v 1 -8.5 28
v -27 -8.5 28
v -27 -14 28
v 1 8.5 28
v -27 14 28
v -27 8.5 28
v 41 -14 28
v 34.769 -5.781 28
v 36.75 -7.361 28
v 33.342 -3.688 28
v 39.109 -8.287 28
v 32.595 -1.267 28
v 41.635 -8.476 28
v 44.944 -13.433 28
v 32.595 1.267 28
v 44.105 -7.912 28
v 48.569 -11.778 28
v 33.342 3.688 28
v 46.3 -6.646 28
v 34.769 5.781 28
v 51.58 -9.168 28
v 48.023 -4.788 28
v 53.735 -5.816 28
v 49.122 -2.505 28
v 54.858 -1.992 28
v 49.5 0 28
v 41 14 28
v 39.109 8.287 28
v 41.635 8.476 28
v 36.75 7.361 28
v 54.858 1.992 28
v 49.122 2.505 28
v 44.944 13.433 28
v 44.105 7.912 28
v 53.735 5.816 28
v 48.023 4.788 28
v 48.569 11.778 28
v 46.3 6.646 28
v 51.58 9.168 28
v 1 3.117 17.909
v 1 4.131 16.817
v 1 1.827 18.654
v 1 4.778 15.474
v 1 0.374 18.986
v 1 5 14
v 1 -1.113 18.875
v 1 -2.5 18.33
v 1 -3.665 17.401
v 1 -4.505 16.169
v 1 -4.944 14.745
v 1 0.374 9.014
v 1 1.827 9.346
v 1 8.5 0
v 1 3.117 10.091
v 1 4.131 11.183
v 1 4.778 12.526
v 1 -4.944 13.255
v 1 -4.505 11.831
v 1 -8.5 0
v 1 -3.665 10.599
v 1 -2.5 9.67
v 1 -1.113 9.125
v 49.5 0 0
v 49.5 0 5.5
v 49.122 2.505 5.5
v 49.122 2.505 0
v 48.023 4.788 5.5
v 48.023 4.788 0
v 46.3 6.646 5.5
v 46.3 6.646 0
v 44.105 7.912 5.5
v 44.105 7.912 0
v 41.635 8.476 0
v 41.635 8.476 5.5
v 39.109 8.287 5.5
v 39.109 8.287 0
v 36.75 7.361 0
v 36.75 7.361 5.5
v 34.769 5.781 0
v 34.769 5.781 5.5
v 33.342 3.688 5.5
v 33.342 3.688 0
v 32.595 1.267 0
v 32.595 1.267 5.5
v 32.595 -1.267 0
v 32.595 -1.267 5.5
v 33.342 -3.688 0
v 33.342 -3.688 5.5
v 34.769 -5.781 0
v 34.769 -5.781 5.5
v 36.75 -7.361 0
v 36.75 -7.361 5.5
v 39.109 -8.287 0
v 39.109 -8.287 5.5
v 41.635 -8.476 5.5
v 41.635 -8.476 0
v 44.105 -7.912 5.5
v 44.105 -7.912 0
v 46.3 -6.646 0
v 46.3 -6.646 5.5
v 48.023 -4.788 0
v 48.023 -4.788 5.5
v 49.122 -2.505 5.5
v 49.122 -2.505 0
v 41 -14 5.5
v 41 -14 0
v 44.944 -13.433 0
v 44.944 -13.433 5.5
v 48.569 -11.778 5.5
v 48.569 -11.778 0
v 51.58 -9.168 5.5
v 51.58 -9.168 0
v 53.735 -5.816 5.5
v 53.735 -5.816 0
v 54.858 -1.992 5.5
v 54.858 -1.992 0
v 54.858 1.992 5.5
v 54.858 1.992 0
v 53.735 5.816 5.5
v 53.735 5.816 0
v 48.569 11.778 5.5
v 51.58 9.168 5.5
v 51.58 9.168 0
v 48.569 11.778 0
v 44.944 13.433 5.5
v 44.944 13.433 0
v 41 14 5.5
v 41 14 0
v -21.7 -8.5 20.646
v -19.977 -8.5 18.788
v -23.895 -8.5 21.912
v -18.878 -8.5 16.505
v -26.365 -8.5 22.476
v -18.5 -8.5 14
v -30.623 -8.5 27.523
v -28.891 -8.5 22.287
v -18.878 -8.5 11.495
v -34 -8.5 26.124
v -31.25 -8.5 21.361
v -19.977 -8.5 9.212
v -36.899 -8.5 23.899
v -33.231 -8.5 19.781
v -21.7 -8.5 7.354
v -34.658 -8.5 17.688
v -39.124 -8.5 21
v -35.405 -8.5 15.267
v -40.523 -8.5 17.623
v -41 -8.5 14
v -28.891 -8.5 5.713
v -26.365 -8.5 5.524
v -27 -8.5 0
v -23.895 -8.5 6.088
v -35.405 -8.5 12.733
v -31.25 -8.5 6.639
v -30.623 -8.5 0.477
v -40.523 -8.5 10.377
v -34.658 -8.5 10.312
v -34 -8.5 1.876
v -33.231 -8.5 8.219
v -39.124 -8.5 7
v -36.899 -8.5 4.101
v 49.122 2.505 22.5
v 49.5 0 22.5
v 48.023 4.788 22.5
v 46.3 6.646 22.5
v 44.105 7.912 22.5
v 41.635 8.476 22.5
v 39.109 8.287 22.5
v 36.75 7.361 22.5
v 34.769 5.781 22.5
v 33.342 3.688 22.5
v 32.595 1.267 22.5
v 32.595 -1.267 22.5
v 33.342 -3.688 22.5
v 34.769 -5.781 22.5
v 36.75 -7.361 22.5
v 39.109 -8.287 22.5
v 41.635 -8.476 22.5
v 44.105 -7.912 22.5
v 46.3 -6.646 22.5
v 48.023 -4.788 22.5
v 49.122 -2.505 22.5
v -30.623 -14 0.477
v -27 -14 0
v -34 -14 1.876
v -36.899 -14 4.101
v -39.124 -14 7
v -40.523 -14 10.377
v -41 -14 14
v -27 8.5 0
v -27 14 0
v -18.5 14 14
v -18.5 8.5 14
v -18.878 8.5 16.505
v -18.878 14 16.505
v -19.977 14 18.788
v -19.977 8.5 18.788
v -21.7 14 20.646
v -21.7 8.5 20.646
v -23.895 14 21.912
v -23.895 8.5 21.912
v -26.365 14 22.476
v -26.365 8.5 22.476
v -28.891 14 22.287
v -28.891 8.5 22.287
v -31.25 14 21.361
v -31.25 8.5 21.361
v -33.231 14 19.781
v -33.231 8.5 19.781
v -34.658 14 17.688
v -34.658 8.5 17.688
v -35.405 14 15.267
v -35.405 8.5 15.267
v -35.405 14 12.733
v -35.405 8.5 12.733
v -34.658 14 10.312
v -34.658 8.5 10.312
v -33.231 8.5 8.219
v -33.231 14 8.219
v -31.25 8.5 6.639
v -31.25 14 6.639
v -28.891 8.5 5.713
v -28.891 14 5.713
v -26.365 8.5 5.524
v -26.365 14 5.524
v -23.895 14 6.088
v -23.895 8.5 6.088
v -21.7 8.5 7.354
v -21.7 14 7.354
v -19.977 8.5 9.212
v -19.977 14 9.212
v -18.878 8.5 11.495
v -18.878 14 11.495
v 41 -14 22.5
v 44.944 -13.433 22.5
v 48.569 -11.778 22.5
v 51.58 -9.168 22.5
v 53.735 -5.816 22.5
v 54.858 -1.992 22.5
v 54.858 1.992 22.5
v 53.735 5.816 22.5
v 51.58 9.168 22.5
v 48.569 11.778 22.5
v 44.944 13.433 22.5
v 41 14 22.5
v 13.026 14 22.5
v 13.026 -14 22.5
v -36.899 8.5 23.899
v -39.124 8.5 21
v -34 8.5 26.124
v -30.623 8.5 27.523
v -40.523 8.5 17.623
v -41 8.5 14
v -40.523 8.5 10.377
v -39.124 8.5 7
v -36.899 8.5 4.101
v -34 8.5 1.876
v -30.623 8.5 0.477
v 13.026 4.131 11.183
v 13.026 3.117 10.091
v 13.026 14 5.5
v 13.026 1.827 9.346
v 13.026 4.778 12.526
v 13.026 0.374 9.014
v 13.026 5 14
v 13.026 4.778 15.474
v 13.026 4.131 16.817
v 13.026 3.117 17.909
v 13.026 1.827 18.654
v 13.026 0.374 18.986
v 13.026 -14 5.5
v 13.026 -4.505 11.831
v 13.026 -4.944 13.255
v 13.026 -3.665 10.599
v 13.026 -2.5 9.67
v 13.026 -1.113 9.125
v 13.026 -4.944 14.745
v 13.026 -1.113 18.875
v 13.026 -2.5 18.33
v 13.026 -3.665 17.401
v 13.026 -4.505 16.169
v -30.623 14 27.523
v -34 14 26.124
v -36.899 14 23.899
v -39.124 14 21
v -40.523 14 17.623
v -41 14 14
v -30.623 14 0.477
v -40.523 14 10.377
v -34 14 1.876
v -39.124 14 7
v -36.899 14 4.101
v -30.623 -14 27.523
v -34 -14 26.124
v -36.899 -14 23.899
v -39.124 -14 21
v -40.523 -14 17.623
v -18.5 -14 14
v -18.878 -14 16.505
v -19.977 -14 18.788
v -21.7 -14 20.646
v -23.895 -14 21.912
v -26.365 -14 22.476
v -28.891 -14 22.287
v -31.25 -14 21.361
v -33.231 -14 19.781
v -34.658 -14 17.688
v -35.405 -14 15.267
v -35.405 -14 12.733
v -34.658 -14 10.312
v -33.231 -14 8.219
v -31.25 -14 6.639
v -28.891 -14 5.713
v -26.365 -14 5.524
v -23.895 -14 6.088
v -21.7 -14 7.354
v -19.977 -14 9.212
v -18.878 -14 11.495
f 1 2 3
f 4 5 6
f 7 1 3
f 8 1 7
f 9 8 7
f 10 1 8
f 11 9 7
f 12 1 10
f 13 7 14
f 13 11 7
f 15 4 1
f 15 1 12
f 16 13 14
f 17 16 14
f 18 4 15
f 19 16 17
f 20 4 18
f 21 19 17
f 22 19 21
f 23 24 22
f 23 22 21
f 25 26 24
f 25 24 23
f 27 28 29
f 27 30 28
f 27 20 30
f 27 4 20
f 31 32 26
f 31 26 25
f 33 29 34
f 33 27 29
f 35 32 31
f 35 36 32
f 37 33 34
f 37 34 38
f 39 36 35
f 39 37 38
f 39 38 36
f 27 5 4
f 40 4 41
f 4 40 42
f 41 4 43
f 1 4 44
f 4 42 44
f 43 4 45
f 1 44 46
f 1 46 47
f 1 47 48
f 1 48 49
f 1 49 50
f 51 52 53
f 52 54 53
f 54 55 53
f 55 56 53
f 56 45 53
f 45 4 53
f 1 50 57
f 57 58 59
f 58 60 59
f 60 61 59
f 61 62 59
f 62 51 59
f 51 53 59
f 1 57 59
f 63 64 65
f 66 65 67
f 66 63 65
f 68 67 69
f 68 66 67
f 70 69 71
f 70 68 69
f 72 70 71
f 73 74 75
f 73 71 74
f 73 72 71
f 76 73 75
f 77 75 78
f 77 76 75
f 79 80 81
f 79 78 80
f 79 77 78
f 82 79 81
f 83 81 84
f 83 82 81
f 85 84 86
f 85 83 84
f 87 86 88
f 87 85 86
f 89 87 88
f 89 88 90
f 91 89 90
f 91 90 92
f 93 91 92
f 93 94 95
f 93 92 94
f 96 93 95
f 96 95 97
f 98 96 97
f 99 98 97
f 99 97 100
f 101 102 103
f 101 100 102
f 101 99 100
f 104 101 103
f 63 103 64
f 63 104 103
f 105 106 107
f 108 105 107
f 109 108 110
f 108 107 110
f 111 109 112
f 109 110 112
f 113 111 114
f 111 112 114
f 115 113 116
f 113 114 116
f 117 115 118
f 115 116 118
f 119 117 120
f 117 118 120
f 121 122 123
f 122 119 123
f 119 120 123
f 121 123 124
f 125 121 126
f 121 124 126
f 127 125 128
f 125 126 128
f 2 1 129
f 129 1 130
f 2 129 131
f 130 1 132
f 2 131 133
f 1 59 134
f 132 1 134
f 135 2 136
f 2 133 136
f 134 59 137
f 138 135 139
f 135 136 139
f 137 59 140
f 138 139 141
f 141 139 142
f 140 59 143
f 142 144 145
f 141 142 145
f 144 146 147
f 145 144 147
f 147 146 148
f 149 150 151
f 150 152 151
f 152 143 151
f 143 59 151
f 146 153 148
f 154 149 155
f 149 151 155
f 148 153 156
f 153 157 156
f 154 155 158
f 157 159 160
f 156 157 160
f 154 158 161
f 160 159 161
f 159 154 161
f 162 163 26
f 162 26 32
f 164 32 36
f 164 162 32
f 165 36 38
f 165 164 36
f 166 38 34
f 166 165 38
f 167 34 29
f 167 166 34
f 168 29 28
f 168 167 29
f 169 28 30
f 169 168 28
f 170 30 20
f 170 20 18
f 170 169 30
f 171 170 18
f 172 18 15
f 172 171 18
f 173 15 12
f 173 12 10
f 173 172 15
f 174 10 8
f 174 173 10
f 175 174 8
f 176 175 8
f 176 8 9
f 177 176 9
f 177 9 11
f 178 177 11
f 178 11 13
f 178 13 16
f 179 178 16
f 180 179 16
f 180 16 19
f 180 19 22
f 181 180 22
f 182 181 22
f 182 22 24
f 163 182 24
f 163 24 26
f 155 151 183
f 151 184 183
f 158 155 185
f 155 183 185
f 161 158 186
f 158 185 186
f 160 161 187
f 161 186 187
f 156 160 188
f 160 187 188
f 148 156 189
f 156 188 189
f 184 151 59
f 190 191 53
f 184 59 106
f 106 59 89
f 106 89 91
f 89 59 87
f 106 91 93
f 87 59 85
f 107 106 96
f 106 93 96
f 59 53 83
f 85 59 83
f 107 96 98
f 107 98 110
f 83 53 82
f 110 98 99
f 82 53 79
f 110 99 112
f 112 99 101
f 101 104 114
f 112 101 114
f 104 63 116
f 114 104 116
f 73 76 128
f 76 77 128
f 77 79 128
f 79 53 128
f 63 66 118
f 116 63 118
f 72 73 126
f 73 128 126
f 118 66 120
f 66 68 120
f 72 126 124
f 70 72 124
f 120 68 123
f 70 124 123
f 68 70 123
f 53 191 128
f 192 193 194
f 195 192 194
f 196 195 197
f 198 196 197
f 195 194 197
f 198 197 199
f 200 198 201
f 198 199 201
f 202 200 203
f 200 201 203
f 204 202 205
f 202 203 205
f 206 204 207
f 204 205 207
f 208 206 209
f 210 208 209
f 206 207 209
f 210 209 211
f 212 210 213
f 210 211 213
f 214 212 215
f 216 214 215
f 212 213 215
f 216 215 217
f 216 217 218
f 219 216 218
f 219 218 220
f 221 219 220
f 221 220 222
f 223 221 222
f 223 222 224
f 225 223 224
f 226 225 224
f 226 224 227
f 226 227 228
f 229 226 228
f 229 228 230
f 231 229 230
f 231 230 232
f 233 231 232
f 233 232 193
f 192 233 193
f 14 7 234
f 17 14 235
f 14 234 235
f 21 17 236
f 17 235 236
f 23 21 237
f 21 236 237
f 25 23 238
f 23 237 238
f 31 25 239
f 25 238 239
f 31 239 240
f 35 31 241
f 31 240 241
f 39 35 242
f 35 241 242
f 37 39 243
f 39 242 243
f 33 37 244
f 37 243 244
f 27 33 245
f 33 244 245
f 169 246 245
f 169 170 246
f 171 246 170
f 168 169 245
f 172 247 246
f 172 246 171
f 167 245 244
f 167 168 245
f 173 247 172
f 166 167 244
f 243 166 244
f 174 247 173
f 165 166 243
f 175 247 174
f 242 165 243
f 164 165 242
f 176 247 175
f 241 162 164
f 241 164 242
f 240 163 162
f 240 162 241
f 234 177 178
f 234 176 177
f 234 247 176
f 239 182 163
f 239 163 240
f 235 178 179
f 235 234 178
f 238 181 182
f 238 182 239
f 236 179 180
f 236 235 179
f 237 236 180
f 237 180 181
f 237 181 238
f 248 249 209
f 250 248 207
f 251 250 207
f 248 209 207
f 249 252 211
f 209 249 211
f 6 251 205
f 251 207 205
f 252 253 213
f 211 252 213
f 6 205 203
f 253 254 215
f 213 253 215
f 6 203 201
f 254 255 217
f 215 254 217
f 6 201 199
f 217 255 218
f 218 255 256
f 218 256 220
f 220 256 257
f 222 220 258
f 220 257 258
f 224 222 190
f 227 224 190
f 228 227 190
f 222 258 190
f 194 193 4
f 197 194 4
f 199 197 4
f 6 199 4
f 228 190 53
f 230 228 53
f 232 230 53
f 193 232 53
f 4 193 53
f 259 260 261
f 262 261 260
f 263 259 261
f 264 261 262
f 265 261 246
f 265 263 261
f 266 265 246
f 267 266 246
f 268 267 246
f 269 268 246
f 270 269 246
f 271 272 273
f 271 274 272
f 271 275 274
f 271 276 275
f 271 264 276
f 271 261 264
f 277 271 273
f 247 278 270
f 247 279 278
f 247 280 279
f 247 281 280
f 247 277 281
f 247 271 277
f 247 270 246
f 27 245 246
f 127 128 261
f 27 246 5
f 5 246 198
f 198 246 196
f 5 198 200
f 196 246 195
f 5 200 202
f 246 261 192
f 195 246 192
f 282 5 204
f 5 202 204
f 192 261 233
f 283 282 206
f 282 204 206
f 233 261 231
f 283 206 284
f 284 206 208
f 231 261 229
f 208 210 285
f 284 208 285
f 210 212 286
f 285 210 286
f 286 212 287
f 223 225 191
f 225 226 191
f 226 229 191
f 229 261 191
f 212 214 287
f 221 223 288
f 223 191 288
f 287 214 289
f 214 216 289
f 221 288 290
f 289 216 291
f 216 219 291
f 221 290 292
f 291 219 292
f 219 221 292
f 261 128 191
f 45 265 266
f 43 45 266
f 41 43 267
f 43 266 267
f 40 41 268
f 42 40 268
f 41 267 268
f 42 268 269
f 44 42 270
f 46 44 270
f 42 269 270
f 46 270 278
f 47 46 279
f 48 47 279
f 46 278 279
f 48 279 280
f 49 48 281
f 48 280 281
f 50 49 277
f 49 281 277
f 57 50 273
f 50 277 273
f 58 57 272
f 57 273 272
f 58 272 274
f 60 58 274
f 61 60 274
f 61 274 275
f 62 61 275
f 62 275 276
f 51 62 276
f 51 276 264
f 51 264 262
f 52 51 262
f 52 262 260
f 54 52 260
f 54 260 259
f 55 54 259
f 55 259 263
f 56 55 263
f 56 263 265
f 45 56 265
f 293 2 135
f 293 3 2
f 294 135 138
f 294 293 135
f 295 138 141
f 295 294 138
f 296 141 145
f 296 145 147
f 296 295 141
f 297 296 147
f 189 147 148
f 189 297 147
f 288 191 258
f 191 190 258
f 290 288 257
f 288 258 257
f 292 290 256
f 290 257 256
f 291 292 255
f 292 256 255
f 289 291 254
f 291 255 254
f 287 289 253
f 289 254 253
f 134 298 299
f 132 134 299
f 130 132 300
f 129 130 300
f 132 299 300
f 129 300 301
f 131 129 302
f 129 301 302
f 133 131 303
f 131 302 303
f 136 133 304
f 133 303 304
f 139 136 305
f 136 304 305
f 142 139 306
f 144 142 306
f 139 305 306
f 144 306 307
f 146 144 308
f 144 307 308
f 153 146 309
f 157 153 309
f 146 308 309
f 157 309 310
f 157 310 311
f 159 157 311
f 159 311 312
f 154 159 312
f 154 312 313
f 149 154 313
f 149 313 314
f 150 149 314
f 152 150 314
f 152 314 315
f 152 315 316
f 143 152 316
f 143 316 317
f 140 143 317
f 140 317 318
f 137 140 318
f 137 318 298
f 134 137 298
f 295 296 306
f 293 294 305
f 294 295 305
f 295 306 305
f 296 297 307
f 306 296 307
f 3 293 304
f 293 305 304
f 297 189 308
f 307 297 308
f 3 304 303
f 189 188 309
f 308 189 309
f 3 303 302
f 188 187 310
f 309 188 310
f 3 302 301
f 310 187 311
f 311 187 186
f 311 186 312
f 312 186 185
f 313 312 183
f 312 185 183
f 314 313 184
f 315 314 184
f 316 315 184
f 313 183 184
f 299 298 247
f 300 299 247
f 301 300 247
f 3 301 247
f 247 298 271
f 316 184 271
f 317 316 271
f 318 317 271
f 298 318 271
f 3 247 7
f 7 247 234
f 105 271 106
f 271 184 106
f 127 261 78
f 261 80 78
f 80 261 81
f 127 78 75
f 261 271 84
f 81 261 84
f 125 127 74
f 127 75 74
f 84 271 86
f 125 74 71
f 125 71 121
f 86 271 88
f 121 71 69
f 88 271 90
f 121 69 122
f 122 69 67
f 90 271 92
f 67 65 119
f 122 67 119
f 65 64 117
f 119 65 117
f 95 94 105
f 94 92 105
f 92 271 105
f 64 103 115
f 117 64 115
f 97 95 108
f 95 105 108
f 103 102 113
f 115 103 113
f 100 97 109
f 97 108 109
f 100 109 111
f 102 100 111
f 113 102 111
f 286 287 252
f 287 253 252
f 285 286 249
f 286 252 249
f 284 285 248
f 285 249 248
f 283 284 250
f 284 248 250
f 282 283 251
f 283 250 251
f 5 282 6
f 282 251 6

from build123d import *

# Parameters (mm, degrees)
F0_R     = 8.5
F1_DEPTH = 28
F2_R     = 8.5
F2_W     = 84
F2_H     = 17
F3_DEPTH = 28.001
F4_R     = 13.99999
F5_R     = 5
F6_DEPTH = 54.0266669521


# Not quite as in the source:
# - a fillet or chamfer is up to 0.001 mm smaller than in the source, because OpenCascade refuses the exact size


with BuildPart() as f1:
    # F0 (on Top) → F1 (new body)
    with BuildSketch(Plane.XY):
        with BuildLine():
            Line((41, 14), (-41, 14))
            Line((-41, 14), (-41, 8.5))
            Line((-41, 8.5), (1, 8.5))
            Line((1, 8.5), (1, -8.5))
            Line((1, -8.5), (-41, -8.5))
            Line((-41, -8.5), (-41, -14))
            Line((-41, -14), (41, -14))
            ThreePointArc((41, -14), (55, 0), (41, 14))
        make_face()
        with Locations((41, 0)):
            Circle(F0_R, mode=Mode.SUBTRACT)
    extrude(amount=F1_DEPTH)

    # F2 (on face) → F3 (cut, through all)
    with BuildSketch(Plane.XZ.offset(14)):
        with Locations((-27, 14)):
            Circle(F2_R)
        with Locations((55.0256669521, 14)):
            Rectangle(F2_W, F2_H)
    extrude(amount=-F3_DEPTH, mode=Mode.SUBTRACT)

    # F4 (radius 14 in the source; OpenCascade refuses exactly that, so slightly less here)
    f4_edges = [f1.edges().sort_by_distance(p)[0] for p in [
        (-41, 11.25, 28),
        (-41, 11.25, 0),
        (-41, -11.25, 28),
        (-41, -11.25, 0),
    ]]
    fillet(f4_edges, radius=F4_R)

    # F5 (on face) → F6 (cut, through all)
    with BuildSketch(Plane.YZ.offset(13.0256669521)):
        with Locations((0, 14)):
            Circle(F5_R)
    extrude(amount=-F6_DEPTH, mode=Mode.SUBTRACT)


solid = f1.part
